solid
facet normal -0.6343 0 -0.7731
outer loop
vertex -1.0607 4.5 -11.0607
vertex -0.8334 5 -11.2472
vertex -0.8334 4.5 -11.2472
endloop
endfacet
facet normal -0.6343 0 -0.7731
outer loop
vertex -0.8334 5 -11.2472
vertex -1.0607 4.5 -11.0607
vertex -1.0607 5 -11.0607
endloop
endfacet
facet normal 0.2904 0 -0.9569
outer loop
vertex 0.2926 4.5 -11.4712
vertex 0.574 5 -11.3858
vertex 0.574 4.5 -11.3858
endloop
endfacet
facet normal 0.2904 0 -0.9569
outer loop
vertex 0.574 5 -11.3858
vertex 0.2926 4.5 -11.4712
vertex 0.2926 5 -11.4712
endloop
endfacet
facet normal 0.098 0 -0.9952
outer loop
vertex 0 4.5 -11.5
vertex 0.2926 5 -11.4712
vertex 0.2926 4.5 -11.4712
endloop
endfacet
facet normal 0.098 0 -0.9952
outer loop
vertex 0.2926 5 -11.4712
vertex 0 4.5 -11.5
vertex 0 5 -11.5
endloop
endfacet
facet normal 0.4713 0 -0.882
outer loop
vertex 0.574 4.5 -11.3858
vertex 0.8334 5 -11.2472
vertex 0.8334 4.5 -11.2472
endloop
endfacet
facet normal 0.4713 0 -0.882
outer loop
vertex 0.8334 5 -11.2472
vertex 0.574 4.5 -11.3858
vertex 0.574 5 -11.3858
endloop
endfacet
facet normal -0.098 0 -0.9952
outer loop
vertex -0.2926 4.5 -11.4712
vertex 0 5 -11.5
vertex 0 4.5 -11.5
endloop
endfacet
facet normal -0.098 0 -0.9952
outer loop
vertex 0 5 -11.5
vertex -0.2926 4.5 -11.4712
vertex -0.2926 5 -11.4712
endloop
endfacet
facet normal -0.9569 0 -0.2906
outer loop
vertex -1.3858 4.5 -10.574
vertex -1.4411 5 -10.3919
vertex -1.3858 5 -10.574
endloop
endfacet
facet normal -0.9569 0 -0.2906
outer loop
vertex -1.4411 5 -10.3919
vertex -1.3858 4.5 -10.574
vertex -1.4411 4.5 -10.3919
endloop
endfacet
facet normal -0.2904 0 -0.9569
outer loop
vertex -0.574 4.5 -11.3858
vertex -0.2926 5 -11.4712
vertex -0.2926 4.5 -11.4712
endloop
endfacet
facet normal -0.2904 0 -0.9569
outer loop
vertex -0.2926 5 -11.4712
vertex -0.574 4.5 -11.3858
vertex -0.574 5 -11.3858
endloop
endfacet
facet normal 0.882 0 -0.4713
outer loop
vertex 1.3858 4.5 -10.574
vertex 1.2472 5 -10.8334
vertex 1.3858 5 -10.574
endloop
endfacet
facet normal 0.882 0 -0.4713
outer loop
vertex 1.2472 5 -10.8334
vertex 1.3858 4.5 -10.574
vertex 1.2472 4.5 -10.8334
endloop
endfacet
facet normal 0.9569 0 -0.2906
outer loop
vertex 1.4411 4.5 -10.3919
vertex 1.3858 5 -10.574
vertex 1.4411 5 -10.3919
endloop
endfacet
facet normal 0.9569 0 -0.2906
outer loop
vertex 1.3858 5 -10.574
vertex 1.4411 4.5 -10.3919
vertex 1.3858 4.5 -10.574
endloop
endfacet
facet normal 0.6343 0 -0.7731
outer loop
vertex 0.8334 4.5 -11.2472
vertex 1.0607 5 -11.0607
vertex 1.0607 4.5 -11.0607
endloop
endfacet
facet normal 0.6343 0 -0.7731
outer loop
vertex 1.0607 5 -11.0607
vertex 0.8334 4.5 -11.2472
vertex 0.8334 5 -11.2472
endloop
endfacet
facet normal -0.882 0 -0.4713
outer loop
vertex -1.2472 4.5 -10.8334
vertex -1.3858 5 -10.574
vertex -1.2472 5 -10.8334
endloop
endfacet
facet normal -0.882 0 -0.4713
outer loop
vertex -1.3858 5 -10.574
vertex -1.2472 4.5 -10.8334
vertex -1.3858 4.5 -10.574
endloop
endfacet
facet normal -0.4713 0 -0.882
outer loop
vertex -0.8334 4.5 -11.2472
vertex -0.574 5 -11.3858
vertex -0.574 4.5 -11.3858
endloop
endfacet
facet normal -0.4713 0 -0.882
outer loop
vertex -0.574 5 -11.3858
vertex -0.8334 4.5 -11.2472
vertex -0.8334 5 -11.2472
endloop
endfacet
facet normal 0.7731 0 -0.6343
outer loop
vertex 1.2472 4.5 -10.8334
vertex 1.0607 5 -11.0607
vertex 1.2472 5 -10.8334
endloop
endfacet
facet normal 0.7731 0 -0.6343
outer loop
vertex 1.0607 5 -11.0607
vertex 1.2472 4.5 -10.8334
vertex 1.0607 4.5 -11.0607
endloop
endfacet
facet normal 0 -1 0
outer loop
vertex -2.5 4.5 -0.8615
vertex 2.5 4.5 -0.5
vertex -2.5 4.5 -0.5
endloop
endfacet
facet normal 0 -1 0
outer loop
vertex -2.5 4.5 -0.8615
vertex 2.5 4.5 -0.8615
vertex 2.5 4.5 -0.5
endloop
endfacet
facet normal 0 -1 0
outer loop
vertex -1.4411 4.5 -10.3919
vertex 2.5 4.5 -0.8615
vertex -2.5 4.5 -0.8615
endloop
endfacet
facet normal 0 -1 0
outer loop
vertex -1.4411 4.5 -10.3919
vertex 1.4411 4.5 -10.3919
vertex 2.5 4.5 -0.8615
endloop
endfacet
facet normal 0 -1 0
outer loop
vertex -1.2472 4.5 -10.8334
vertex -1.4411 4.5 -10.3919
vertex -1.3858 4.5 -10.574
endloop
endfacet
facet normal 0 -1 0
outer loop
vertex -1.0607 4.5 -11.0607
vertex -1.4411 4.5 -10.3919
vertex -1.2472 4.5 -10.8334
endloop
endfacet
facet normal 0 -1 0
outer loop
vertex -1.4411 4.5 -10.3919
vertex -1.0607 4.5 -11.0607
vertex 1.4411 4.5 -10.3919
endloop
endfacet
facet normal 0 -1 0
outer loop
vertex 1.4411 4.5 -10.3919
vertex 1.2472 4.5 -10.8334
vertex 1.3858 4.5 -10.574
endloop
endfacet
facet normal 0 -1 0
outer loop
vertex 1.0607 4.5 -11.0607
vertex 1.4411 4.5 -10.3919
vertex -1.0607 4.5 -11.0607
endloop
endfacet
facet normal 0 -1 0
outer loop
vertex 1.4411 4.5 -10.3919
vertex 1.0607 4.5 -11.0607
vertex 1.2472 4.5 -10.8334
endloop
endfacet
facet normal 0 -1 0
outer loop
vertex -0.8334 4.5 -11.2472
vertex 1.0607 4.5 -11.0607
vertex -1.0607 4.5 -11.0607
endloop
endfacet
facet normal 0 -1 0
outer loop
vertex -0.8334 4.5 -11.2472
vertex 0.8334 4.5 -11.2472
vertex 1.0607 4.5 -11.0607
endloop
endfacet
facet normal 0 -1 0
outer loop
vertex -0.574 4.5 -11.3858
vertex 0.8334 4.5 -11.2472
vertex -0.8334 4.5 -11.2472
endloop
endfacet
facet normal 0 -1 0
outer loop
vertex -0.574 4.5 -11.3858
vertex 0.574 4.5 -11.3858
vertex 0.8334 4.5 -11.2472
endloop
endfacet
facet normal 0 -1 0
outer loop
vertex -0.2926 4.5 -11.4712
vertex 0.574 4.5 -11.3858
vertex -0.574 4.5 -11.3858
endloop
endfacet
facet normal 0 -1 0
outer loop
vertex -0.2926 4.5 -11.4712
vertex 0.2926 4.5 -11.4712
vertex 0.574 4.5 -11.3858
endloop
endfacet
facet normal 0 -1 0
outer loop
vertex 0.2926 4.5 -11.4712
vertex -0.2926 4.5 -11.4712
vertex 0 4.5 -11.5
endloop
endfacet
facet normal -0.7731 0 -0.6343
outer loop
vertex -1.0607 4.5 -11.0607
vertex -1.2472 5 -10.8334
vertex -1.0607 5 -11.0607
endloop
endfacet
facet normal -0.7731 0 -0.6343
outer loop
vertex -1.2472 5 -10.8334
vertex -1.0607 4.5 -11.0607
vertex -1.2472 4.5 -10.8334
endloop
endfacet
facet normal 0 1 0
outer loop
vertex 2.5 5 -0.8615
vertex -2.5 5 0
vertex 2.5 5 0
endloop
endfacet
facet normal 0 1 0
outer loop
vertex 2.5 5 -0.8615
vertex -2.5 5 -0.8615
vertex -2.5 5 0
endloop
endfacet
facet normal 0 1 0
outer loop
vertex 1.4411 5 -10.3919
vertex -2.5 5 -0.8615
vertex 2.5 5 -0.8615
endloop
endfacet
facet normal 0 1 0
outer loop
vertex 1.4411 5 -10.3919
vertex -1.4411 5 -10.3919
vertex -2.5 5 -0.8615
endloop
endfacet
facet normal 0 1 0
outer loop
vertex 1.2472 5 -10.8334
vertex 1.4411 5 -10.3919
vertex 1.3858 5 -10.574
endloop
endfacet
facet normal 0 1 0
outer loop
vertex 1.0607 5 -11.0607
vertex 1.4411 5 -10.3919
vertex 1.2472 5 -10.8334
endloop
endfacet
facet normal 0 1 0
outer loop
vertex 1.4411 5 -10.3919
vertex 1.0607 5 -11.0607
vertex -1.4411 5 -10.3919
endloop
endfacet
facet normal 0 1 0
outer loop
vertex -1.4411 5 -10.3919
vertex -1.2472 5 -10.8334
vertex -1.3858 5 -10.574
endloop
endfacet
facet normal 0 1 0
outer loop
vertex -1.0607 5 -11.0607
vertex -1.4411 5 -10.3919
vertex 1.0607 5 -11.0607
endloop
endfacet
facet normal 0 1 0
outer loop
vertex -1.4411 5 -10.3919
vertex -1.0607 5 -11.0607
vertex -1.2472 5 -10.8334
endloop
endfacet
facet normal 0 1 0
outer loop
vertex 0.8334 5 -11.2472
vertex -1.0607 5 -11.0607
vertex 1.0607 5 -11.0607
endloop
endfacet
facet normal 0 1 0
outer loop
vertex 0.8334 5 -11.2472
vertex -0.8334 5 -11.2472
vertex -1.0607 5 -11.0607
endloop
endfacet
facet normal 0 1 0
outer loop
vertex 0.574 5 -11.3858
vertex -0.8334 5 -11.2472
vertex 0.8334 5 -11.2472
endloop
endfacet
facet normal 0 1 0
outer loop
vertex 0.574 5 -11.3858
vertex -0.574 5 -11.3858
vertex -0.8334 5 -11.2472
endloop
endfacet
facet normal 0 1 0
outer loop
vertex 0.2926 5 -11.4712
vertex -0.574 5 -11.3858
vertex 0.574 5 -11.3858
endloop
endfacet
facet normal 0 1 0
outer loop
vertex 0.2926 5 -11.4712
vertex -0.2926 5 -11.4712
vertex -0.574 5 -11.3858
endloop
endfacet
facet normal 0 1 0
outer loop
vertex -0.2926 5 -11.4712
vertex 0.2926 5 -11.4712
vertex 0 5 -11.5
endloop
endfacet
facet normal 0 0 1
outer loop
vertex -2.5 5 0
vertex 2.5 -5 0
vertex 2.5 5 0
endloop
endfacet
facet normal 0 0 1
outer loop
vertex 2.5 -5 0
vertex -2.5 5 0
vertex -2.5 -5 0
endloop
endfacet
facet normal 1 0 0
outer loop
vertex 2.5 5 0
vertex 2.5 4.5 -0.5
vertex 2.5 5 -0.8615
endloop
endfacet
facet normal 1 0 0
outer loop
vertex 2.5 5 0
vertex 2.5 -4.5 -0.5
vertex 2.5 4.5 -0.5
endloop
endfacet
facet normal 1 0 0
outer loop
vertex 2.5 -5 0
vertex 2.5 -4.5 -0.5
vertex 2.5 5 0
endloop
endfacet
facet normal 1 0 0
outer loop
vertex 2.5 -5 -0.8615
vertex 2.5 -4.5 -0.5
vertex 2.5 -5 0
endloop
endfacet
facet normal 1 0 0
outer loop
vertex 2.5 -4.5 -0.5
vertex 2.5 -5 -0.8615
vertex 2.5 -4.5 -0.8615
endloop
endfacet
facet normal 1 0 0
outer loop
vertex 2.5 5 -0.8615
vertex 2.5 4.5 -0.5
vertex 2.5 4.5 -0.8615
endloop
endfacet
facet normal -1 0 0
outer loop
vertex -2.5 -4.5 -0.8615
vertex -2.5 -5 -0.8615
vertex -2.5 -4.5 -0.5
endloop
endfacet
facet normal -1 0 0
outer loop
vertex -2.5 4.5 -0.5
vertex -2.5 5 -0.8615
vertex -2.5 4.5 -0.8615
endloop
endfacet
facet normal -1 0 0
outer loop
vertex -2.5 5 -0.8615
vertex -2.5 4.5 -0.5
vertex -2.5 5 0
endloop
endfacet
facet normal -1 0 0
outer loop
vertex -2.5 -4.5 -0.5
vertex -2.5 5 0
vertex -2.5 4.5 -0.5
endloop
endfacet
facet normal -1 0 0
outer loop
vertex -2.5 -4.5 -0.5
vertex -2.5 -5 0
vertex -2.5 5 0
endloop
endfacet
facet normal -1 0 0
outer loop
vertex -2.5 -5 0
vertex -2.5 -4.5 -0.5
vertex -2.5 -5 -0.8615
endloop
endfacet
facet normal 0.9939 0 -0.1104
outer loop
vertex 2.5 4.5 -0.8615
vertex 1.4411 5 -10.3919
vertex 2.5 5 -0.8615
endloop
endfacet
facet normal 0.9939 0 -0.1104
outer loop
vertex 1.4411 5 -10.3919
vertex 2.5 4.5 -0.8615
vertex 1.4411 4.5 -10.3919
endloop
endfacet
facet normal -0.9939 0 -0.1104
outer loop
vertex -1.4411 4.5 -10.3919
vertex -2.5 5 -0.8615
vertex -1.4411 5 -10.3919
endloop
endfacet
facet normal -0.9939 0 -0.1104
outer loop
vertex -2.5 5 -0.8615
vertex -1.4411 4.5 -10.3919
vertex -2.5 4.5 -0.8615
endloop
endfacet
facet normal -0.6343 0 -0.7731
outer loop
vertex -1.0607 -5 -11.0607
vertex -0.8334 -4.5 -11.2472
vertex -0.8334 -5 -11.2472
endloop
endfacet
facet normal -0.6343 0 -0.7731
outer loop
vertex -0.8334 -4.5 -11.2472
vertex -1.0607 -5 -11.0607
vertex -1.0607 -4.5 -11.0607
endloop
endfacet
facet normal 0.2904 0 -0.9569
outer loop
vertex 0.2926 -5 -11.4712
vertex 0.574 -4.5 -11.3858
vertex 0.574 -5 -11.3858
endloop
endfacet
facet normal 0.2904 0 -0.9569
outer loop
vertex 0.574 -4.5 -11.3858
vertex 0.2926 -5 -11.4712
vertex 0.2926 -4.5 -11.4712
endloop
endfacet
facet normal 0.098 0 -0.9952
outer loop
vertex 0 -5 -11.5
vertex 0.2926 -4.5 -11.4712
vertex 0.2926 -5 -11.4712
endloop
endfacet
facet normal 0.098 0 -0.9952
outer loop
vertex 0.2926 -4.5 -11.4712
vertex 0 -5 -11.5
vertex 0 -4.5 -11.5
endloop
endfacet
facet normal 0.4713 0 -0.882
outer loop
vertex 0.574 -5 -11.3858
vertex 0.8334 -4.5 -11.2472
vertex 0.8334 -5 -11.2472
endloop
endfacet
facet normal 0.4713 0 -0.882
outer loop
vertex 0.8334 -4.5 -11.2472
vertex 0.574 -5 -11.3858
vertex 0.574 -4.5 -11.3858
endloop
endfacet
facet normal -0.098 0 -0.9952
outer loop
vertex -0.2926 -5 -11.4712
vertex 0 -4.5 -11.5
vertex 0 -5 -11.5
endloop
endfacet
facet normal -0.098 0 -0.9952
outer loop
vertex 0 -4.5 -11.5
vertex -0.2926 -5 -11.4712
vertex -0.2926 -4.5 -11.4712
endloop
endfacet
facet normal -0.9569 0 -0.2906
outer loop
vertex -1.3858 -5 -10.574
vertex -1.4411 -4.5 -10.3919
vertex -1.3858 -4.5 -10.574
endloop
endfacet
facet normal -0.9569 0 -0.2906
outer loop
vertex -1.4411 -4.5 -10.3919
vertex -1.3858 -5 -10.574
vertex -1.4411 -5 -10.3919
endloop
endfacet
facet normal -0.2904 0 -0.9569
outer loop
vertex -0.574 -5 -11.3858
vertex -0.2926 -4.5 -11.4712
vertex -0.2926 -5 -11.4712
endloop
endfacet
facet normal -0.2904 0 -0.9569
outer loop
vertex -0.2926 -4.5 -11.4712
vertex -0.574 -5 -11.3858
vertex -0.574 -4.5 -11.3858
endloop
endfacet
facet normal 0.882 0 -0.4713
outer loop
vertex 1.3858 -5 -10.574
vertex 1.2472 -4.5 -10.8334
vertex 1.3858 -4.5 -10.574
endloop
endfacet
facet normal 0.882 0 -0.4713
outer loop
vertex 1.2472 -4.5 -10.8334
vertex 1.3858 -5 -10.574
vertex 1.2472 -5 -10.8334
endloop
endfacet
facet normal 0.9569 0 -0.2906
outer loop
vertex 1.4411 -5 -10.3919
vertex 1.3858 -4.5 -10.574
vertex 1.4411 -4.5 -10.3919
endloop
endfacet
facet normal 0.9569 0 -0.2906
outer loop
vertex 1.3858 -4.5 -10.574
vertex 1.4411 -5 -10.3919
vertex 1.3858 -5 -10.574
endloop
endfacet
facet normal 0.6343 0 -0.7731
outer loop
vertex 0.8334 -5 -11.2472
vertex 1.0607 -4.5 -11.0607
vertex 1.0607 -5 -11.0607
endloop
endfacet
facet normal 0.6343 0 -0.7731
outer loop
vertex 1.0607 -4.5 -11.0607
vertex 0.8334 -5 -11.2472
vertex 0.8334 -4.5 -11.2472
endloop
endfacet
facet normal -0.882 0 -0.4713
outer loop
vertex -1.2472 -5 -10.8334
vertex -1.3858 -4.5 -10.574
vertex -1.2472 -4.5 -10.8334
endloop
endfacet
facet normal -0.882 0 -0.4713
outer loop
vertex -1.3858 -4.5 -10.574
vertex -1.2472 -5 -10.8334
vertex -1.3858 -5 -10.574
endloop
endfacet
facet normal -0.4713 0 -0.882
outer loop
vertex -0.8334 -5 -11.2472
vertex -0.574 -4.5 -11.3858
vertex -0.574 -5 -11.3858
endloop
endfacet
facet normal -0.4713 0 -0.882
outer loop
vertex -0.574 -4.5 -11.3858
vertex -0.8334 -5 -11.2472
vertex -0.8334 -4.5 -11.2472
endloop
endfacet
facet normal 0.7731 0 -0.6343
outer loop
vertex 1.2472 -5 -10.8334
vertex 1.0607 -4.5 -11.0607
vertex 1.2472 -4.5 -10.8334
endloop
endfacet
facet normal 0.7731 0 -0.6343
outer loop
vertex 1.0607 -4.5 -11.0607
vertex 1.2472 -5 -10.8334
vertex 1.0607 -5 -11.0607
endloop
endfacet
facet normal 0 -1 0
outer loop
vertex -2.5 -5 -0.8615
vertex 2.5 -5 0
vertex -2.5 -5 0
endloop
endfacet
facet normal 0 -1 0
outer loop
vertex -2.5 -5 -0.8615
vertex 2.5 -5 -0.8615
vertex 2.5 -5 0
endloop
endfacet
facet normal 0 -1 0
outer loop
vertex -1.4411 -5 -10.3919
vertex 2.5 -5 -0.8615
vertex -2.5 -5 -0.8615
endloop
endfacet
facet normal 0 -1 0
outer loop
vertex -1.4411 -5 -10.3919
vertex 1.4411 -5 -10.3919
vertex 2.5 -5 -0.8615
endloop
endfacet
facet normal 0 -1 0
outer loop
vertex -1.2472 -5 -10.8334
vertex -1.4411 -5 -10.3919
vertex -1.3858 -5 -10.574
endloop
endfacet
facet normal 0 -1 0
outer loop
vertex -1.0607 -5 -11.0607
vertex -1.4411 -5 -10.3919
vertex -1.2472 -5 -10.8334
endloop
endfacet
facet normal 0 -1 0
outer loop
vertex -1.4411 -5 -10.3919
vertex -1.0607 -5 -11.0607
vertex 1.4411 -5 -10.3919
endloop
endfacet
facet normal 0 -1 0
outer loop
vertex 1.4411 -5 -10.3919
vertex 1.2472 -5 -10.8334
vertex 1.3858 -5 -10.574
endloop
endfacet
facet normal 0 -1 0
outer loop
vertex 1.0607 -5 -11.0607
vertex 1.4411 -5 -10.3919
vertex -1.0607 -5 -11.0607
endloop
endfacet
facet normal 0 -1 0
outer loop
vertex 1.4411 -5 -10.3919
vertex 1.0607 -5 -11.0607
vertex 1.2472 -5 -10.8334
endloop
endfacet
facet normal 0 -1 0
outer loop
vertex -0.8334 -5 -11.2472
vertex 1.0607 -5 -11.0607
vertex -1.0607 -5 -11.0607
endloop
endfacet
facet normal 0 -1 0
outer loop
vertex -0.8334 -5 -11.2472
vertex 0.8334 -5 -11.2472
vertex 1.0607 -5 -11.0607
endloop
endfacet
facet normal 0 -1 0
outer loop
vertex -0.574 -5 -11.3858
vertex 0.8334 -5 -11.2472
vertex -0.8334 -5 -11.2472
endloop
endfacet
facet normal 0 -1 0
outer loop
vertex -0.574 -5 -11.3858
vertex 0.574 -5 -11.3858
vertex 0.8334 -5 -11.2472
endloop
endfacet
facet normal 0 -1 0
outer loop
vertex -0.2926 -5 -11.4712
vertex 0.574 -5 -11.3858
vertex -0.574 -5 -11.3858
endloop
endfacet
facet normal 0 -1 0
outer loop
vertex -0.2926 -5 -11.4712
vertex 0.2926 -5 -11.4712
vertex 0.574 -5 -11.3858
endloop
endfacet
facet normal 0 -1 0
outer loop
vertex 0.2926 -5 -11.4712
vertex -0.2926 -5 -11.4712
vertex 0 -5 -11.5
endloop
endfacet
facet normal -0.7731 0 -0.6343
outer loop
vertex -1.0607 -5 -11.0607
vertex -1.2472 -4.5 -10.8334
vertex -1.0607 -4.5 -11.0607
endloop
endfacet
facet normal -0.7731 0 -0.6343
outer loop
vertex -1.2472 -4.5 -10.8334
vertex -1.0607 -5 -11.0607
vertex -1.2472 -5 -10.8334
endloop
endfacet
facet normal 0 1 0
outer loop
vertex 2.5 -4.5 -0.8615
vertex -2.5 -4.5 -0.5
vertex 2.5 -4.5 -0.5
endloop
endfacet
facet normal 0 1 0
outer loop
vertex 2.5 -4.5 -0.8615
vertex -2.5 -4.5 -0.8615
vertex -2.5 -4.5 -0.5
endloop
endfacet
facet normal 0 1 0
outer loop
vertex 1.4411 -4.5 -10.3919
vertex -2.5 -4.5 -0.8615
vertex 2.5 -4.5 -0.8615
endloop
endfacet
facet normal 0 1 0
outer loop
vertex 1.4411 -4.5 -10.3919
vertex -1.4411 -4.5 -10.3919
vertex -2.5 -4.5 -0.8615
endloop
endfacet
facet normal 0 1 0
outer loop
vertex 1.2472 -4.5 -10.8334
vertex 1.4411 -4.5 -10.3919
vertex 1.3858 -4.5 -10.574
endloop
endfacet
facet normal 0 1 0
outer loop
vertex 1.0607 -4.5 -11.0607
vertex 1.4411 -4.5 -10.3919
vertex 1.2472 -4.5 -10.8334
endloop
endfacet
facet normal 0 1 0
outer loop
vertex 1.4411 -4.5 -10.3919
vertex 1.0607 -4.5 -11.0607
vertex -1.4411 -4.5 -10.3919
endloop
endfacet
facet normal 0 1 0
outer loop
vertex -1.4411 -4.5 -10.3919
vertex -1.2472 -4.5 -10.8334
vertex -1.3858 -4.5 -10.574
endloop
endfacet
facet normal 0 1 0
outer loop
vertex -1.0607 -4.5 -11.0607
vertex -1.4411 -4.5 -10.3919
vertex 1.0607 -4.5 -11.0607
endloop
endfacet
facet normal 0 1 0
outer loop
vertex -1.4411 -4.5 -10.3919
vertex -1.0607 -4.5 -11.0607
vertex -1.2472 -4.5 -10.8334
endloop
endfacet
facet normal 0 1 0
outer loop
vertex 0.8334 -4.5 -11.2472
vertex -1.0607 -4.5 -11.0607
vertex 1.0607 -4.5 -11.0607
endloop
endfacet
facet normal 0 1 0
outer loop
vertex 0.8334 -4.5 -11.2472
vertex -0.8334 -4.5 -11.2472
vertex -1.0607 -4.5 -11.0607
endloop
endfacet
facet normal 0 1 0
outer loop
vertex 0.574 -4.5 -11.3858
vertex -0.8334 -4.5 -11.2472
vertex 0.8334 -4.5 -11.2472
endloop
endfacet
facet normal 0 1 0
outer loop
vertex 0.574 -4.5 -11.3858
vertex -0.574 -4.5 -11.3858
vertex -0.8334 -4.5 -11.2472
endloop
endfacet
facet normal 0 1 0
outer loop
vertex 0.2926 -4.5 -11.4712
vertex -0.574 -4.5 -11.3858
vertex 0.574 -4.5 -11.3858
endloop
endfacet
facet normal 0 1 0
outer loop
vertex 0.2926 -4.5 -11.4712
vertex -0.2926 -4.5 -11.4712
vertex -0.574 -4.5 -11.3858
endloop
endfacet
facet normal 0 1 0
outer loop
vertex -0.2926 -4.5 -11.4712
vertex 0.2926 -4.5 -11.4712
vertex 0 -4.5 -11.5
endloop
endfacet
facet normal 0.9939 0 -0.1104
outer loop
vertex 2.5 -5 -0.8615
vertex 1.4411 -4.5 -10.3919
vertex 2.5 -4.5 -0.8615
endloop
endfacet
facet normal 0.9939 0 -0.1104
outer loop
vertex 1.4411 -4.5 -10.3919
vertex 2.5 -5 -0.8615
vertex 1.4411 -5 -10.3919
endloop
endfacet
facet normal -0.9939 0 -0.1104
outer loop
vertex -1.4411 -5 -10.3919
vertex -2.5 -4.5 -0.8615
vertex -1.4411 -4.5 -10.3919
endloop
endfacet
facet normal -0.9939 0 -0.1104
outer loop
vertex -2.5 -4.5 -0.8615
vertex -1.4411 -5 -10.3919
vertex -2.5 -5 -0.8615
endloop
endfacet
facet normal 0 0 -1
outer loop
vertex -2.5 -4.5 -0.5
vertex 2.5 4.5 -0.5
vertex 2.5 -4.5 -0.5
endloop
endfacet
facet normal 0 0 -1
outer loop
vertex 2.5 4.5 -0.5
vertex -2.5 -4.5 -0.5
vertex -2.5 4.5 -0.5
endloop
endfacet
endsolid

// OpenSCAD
/* axleBracket1.scad
 A simple U bracket to hold an axle
*/

thickness = 0.5;
width = 10;
length = 5;
axleElevation = 10;
hubRadius = 1.5;

translate([0,0,-thickness/2])
	cube([length, width, thickness], center=true);
translate([0,(width/2 - thickness/2),0])
	leg();
translate([0,-(width/2 - thickness/2),0])
	leg();

module leg() {
	rotate([90,0,0])
		rotate([0,0,-90])
			difference() {
				union() {
					translate([axleElevation,0,0])
						cylinder(r=hubRadius, h=thickness, center=true, $fn=32);
					translate([axleElevation/2,0,0])
						cube([axleElevation, length, thickness], center=true);
				}
				translate([1,5,0])
					rotate([0,0,-6.3401975])
						cube([20, 5, thickness*2], center=true);
				translate([1,-5,0])
					rotate([0,0,6.3401975])
						cube([20, 5, thickness*2], center=true);
			}
}
